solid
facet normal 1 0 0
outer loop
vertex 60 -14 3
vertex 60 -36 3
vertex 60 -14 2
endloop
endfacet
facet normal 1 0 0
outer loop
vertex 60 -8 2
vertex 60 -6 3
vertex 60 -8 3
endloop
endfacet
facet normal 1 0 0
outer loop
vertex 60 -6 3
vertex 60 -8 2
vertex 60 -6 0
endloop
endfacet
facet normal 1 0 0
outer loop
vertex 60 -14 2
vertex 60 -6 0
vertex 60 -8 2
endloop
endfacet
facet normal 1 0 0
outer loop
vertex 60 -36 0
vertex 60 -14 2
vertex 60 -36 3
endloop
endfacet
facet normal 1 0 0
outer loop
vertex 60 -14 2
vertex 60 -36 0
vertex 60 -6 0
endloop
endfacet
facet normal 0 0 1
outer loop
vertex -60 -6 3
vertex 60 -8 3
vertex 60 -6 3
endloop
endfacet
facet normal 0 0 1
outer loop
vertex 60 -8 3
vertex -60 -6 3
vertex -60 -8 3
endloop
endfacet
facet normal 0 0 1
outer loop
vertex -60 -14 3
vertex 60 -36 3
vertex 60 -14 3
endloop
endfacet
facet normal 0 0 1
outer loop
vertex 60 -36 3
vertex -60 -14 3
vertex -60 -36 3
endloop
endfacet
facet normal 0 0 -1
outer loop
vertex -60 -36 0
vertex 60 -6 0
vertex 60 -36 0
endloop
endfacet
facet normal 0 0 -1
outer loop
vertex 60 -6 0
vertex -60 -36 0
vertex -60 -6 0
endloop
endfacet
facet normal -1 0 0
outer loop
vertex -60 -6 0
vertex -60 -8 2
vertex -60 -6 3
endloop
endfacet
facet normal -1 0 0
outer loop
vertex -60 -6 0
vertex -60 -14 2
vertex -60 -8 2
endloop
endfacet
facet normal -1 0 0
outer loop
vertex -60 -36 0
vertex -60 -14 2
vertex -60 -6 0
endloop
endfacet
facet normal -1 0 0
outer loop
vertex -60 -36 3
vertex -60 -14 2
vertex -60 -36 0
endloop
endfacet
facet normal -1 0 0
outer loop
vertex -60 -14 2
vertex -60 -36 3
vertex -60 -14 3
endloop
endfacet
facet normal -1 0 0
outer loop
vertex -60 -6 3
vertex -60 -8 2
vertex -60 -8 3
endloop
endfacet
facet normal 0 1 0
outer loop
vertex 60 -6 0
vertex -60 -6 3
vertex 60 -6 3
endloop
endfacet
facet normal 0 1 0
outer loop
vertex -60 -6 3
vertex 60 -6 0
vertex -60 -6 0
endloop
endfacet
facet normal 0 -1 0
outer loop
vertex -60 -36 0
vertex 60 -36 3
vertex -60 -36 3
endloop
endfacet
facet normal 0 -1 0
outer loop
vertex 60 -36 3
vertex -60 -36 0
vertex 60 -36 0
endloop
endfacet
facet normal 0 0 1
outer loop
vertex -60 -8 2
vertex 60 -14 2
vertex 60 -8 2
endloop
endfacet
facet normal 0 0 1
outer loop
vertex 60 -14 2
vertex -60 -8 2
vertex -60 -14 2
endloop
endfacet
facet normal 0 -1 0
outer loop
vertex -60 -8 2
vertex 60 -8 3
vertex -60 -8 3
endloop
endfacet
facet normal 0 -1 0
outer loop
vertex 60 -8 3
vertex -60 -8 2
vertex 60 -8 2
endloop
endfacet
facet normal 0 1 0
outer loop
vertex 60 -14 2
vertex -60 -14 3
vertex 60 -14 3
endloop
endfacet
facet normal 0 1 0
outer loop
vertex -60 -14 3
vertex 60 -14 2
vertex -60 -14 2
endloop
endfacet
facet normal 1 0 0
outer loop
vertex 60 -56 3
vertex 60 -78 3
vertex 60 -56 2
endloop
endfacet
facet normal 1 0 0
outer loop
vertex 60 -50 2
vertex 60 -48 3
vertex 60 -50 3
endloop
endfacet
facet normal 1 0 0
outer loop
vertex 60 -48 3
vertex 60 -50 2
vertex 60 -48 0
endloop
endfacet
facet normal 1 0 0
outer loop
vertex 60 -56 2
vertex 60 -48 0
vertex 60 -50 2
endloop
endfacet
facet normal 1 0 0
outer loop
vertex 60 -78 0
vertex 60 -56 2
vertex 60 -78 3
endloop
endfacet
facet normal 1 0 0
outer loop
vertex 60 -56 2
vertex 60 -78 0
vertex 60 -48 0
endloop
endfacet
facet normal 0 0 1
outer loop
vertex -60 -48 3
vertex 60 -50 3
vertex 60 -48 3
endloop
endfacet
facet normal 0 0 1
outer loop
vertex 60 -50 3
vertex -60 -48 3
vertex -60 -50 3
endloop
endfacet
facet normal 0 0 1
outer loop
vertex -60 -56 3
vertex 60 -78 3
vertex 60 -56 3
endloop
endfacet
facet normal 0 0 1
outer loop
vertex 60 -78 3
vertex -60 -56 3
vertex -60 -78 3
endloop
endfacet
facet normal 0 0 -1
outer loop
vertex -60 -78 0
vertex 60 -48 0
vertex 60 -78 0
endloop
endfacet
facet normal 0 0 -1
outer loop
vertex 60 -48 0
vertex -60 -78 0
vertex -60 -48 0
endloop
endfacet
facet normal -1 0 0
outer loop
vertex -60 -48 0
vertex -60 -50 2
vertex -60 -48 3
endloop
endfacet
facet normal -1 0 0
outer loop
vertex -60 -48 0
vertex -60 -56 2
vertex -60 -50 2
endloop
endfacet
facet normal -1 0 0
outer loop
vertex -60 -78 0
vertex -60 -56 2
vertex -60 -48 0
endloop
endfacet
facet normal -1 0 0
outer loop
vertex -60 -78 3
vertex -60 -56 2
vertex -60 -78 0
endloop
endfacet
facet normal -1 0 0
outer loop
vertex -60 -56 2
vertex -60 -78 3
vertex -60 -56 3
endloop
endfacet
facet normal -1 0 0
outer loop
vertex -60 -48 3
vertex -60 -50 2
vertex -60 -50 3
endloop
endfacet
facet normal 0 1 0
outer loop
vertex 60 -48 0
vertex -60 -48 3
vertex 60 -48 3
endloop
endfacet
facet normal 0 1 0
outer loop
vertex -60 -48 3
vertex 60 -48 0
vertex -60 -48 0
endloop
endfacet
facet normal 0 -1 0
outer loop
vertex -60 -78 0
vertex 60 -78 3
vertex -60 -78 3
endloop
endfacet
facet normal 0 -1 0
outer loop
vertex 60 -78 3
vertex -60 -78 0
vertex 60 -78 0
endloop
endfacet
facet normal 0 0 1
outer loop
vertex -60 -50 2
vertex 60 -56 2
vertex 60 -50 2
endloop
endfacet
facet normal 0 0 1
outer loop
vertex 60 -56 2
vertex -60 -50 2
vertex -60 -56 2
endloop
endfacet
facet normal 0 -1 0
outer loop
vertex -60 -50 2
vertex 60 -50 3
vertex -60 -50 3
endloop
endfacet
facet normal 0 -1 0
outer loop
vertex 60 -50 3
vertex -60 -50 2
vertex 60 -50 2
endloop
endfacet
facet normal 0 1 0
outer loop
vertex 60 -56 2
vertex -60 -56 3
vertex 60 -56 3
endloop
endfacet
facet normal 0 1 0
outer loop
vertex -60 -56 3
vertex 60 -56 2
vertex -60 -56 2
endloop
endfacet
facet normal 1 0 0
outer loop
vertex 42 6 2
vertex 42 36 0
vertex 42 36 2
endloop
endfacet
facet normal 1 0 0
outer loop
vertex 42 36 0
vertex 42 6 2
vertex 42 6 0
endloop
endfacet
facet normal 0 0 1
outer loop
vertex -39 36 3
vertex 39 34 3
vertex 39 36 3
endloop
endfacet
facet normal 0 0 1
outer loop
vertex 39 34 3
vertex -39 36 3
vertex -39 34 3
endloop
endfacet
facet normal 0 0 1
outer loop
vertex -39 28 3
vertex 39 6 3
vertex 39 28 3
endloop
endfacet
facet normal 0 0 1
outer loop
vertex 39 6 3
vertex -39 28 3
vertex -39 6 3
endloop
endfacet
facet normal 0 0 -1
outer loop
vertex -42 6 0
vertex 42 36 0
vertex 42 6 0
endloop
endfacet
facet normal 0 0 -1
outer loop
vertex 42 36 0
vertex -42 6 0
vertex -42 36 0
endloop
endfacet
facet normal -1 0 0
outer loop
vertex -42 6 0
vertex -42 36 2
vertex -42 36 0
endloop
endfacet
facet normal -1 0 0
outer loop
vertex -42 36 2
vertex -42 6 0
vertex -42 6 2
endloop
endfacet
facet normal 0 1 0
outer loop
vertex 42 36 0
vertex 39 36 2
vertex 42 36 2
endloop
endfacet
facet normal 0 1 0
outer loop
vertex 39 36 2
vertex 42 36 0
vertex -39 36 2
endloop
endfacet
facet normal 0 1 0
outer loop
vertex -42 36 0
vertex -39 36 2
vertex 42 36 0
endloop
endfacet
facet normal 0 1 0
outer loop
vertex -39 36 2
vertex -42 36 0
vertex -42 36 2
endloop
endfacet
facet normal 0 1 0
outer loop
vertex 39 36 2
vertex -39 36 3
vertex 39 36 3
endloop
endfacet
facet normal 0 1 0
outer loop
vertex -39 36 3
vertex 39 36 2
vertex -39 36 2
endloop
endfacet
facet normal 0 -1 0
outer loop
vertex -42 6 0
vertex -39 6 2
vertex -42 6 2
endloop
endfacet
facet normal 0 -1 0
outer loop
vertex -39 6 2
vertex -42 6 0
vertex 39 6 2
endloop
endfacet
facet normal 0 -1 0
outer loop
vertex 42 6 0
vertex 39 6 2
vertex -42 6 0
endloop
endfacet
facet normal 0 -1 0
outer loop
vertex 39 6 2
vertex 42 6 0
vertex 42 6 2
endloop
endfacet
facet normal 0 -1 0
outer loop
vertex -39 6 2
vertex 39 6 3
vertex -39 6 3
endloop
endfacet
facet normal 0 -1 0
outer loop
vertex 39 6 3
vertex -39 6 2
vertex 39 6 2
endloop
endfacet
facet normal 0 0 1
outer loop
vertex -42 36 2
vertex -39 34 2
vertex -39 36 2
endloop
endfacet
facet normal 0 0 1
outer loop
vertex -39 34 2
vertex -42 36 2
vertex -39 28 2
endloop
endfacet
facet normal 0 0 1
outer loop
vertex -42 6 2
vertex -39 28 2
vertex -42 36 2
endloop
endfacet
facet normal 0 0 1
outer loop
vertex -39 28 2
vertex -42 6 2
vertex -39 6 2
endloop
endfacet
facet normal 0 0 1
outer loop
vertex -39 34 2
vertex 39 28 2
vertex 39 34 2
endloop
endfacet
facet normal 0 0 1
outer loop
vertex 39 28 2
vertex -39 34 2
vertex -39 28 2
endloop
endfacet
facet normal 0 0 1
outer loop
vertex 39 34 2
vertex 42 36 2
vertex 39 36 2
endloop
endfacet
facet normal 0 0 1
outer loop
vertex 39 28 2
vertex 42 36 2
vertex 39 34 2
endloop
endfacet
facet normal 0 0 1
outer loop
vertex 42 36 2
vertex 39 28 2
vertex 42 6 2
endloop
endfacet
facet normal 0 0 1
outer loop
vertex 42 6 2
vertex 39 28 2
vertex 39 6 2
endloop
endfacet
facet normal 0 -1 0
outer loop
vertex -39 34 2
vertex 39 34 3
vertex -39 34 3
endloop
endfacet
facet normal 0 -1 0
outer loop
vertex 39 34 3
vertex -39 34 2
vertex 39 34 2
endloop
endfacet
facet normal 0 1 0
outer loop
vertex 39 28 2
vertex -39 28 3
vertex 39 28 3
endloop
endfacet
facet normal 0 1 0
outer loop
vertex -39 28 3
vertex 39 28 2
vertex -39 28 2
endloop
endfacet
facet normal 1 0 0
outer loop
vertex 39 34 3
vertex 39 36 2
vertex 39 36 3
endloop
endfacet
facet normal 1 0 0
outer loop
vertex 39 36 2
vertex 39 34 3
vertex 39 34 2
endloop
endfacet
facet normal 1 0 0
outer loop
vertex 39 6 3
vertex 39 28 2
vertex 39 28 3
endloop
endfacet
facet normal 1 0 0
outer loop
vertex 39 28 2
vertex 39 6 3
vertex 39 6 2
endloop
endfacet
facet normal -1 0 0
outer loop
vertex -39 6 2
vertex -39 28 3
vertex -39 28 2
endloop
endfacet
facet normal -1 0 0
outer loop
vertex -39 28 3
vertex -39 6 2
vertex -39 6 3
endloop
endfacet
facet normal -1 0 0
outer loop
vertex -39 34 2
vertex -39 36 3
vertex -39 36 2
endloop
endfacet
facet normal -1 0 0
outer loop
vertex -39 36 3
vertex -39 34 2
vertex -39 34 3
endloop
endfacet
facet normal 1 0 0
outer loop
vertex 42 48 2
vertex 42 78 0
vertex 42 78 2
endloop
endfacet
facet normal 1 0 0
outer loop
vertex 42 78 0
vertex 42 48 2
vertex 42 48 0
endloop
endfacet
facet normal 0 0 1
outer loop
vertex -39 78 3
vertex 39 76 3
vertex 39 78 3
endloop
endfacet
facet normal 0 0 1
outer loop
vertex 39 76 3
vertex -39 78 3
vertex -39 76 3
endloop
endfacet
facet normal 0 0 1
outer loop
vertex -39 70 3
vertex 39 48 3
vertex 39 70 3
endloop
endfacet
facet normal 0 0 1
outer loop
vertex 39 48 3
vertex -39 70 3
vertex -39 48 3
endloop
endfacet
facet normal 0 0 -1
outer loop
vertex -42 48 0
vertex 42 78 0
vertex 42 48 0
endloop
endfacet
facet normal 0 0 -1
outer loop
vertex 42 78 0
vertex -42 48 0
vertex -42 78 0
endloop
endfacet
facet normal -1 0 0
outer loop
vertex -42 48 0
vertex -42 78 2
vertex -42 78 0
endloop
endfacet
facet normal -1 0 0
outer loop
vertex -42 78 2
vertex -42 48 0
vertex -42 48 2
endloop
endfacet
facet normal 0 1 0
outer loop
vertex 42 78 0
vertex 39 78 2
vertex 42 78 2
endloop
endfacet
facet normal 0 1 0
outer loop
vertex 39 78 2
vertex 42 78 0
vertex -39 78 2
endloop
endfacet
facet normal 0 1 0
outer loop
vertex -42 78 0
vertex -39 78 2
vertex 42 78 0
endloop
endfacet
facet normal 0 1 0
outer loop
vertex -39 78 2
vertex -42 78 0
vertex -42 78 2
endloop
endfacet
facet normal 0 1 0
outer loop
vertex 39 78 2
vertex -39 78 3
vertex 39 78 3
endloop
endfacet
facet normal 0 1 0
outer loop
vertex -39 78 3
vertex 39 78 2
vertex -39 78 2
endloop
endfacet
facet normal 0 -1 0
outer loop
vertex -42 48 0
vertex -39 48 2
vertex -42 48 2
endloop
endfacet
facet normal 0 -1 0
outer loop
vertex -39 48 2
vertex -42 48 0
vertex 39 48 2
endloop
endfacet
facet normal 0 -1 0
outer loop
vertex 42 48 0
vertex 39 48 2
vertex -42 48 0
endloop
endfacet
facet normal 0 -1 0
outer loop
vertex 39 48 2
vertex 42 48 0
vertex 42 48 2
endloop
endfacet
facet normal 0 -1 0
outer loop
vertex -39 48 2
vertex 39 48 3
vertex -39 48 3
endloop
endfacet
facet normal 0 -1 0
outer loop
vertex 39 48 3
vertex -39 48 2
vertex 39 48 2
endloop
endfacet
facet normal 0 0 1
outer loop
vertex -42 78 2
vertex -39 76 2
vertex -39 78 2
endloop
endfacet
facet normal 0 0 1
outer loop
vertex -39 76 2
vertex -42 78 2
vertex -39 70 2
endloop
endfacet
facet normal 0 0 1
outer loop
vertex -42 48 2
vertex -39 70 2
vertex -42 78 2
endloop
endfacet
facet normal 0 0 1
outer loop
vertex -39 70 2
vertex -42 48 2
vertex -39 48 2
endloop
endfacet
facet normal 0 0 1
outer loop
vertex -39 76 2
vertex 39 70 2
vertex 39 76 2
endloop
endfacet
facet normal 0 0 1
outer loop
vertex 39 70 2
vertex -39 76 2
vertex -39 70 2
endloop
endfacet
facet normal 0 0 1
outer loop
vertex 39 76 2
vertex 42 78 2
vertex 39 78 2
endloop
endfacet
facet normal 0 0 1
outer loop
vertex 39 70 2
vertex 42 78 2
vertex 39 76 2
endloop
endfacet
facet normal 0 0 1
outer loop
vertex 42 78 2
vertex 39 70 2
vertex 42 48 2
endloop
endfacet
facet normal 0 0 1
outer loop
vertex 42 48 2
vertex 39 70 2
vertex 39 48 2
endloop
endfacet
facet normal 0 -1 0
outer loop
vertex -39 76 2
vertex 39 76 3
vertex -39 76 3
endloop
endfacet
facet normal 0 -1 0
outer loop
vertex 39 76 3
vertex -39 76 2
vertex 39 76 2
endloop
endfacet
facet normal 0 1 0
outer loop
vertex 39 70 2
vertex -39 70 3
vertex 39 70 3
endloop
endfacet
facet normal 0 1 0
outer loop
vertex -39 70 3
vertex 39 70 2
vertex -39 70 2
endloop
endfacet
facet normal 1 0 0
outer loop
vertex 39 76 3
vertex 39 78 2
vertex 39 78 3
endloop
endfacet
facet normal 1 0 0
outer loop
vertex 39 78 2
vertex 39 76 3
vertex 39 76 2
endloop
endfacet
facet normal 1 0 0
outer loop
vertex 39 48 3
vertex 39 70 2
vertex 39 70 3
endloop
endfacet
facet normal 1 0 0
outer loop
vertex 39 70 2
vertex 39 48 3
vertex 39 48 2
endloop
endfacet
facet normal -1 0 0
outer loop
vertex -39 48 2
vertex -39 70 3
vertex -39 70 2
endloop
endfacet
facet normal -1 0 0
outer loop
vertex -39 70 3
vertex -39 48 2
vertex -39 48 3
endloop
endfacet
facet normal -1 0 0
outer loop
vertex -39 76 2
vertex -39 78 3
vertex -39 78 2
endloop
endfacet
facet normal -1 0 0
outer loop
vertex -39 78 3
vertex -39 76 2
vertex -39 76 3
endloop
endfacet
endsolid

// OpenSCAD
// file: modules.scad
width   = 120;
height  = 80;
glass_thickness = 6;
wall_height = 30;
wall_thickness = 3;
cut_depth = 1;
support_height = 2;

module glass(w,d,h) {
  color([1,1,1,0.35])
  cube([w,d,h], center=true);
}

module side0(width, height, support_height, wall_thickness, cut_depth, glass_thickness) {
  gap_width = width + 2;
  difference() {
    cube([width,height,wall_thickness], center=true);
    translate([
      -1,
      height / 2 - support_height - glass_thickness / 2,
      wall_thickness-cut_depth
    ])
      cube([gap_width,glass_thickness,wall_thickness], center=true);
  }
}

module side1(width, height, support_height, wall_thickness, cut_depth, glass_thickness) {
  color([1,0.1,0.0,0.85])
    side0(width, height, support_height, wall_thickness, cut_depth, glass_thickness);
}

module side2(width, height, support_height, wall_thickness, cut_depth, glass_thickness) {
  height2 = height + 2;
  color([1,0.4,0.1,0.85])
    difference() {
      side0(width, height, support_height, wall_thickness, cut_depth, glass_thickness);
      translate([width/2-wall_thickness/2+1,0,wall_thickness-cut_depth])
        cube([wall_thickness+2,height2,wall_thickness], center=true);
      translate([-width/2+wall_thickness/2-1,0,wall_thickness-cut_depth])
        cube([wall_thickness+2,height2,wall_thickness], center=true);
    }
}

module sideA() {
  side1(width + cut_depth * 0, wall_height, support_height, wall_thickness, cut_depth, glass_thickness);
}

module sideB() {
  side2(height+(wall_thickness-cut_depth)*2, wall_height, support_height, wall_thickness, cut_depth, glass_thickness);
}
// main file
include <modules.scad>;

offset = 12;
dist = (wall_height + offset) / 2;

translate([0,0,wall_thickness/2]) {
  translate([0,-dist,0])
    sideA();
  translate([0,-dist - wall_height - offset])
    sideA();
  translate([0, dist,0])
    sideB();
  translate([0, dist + wall_height + offset,0])
    sideB();
}

//cube([12 * inch, 25 * inch, 1], center = true);
